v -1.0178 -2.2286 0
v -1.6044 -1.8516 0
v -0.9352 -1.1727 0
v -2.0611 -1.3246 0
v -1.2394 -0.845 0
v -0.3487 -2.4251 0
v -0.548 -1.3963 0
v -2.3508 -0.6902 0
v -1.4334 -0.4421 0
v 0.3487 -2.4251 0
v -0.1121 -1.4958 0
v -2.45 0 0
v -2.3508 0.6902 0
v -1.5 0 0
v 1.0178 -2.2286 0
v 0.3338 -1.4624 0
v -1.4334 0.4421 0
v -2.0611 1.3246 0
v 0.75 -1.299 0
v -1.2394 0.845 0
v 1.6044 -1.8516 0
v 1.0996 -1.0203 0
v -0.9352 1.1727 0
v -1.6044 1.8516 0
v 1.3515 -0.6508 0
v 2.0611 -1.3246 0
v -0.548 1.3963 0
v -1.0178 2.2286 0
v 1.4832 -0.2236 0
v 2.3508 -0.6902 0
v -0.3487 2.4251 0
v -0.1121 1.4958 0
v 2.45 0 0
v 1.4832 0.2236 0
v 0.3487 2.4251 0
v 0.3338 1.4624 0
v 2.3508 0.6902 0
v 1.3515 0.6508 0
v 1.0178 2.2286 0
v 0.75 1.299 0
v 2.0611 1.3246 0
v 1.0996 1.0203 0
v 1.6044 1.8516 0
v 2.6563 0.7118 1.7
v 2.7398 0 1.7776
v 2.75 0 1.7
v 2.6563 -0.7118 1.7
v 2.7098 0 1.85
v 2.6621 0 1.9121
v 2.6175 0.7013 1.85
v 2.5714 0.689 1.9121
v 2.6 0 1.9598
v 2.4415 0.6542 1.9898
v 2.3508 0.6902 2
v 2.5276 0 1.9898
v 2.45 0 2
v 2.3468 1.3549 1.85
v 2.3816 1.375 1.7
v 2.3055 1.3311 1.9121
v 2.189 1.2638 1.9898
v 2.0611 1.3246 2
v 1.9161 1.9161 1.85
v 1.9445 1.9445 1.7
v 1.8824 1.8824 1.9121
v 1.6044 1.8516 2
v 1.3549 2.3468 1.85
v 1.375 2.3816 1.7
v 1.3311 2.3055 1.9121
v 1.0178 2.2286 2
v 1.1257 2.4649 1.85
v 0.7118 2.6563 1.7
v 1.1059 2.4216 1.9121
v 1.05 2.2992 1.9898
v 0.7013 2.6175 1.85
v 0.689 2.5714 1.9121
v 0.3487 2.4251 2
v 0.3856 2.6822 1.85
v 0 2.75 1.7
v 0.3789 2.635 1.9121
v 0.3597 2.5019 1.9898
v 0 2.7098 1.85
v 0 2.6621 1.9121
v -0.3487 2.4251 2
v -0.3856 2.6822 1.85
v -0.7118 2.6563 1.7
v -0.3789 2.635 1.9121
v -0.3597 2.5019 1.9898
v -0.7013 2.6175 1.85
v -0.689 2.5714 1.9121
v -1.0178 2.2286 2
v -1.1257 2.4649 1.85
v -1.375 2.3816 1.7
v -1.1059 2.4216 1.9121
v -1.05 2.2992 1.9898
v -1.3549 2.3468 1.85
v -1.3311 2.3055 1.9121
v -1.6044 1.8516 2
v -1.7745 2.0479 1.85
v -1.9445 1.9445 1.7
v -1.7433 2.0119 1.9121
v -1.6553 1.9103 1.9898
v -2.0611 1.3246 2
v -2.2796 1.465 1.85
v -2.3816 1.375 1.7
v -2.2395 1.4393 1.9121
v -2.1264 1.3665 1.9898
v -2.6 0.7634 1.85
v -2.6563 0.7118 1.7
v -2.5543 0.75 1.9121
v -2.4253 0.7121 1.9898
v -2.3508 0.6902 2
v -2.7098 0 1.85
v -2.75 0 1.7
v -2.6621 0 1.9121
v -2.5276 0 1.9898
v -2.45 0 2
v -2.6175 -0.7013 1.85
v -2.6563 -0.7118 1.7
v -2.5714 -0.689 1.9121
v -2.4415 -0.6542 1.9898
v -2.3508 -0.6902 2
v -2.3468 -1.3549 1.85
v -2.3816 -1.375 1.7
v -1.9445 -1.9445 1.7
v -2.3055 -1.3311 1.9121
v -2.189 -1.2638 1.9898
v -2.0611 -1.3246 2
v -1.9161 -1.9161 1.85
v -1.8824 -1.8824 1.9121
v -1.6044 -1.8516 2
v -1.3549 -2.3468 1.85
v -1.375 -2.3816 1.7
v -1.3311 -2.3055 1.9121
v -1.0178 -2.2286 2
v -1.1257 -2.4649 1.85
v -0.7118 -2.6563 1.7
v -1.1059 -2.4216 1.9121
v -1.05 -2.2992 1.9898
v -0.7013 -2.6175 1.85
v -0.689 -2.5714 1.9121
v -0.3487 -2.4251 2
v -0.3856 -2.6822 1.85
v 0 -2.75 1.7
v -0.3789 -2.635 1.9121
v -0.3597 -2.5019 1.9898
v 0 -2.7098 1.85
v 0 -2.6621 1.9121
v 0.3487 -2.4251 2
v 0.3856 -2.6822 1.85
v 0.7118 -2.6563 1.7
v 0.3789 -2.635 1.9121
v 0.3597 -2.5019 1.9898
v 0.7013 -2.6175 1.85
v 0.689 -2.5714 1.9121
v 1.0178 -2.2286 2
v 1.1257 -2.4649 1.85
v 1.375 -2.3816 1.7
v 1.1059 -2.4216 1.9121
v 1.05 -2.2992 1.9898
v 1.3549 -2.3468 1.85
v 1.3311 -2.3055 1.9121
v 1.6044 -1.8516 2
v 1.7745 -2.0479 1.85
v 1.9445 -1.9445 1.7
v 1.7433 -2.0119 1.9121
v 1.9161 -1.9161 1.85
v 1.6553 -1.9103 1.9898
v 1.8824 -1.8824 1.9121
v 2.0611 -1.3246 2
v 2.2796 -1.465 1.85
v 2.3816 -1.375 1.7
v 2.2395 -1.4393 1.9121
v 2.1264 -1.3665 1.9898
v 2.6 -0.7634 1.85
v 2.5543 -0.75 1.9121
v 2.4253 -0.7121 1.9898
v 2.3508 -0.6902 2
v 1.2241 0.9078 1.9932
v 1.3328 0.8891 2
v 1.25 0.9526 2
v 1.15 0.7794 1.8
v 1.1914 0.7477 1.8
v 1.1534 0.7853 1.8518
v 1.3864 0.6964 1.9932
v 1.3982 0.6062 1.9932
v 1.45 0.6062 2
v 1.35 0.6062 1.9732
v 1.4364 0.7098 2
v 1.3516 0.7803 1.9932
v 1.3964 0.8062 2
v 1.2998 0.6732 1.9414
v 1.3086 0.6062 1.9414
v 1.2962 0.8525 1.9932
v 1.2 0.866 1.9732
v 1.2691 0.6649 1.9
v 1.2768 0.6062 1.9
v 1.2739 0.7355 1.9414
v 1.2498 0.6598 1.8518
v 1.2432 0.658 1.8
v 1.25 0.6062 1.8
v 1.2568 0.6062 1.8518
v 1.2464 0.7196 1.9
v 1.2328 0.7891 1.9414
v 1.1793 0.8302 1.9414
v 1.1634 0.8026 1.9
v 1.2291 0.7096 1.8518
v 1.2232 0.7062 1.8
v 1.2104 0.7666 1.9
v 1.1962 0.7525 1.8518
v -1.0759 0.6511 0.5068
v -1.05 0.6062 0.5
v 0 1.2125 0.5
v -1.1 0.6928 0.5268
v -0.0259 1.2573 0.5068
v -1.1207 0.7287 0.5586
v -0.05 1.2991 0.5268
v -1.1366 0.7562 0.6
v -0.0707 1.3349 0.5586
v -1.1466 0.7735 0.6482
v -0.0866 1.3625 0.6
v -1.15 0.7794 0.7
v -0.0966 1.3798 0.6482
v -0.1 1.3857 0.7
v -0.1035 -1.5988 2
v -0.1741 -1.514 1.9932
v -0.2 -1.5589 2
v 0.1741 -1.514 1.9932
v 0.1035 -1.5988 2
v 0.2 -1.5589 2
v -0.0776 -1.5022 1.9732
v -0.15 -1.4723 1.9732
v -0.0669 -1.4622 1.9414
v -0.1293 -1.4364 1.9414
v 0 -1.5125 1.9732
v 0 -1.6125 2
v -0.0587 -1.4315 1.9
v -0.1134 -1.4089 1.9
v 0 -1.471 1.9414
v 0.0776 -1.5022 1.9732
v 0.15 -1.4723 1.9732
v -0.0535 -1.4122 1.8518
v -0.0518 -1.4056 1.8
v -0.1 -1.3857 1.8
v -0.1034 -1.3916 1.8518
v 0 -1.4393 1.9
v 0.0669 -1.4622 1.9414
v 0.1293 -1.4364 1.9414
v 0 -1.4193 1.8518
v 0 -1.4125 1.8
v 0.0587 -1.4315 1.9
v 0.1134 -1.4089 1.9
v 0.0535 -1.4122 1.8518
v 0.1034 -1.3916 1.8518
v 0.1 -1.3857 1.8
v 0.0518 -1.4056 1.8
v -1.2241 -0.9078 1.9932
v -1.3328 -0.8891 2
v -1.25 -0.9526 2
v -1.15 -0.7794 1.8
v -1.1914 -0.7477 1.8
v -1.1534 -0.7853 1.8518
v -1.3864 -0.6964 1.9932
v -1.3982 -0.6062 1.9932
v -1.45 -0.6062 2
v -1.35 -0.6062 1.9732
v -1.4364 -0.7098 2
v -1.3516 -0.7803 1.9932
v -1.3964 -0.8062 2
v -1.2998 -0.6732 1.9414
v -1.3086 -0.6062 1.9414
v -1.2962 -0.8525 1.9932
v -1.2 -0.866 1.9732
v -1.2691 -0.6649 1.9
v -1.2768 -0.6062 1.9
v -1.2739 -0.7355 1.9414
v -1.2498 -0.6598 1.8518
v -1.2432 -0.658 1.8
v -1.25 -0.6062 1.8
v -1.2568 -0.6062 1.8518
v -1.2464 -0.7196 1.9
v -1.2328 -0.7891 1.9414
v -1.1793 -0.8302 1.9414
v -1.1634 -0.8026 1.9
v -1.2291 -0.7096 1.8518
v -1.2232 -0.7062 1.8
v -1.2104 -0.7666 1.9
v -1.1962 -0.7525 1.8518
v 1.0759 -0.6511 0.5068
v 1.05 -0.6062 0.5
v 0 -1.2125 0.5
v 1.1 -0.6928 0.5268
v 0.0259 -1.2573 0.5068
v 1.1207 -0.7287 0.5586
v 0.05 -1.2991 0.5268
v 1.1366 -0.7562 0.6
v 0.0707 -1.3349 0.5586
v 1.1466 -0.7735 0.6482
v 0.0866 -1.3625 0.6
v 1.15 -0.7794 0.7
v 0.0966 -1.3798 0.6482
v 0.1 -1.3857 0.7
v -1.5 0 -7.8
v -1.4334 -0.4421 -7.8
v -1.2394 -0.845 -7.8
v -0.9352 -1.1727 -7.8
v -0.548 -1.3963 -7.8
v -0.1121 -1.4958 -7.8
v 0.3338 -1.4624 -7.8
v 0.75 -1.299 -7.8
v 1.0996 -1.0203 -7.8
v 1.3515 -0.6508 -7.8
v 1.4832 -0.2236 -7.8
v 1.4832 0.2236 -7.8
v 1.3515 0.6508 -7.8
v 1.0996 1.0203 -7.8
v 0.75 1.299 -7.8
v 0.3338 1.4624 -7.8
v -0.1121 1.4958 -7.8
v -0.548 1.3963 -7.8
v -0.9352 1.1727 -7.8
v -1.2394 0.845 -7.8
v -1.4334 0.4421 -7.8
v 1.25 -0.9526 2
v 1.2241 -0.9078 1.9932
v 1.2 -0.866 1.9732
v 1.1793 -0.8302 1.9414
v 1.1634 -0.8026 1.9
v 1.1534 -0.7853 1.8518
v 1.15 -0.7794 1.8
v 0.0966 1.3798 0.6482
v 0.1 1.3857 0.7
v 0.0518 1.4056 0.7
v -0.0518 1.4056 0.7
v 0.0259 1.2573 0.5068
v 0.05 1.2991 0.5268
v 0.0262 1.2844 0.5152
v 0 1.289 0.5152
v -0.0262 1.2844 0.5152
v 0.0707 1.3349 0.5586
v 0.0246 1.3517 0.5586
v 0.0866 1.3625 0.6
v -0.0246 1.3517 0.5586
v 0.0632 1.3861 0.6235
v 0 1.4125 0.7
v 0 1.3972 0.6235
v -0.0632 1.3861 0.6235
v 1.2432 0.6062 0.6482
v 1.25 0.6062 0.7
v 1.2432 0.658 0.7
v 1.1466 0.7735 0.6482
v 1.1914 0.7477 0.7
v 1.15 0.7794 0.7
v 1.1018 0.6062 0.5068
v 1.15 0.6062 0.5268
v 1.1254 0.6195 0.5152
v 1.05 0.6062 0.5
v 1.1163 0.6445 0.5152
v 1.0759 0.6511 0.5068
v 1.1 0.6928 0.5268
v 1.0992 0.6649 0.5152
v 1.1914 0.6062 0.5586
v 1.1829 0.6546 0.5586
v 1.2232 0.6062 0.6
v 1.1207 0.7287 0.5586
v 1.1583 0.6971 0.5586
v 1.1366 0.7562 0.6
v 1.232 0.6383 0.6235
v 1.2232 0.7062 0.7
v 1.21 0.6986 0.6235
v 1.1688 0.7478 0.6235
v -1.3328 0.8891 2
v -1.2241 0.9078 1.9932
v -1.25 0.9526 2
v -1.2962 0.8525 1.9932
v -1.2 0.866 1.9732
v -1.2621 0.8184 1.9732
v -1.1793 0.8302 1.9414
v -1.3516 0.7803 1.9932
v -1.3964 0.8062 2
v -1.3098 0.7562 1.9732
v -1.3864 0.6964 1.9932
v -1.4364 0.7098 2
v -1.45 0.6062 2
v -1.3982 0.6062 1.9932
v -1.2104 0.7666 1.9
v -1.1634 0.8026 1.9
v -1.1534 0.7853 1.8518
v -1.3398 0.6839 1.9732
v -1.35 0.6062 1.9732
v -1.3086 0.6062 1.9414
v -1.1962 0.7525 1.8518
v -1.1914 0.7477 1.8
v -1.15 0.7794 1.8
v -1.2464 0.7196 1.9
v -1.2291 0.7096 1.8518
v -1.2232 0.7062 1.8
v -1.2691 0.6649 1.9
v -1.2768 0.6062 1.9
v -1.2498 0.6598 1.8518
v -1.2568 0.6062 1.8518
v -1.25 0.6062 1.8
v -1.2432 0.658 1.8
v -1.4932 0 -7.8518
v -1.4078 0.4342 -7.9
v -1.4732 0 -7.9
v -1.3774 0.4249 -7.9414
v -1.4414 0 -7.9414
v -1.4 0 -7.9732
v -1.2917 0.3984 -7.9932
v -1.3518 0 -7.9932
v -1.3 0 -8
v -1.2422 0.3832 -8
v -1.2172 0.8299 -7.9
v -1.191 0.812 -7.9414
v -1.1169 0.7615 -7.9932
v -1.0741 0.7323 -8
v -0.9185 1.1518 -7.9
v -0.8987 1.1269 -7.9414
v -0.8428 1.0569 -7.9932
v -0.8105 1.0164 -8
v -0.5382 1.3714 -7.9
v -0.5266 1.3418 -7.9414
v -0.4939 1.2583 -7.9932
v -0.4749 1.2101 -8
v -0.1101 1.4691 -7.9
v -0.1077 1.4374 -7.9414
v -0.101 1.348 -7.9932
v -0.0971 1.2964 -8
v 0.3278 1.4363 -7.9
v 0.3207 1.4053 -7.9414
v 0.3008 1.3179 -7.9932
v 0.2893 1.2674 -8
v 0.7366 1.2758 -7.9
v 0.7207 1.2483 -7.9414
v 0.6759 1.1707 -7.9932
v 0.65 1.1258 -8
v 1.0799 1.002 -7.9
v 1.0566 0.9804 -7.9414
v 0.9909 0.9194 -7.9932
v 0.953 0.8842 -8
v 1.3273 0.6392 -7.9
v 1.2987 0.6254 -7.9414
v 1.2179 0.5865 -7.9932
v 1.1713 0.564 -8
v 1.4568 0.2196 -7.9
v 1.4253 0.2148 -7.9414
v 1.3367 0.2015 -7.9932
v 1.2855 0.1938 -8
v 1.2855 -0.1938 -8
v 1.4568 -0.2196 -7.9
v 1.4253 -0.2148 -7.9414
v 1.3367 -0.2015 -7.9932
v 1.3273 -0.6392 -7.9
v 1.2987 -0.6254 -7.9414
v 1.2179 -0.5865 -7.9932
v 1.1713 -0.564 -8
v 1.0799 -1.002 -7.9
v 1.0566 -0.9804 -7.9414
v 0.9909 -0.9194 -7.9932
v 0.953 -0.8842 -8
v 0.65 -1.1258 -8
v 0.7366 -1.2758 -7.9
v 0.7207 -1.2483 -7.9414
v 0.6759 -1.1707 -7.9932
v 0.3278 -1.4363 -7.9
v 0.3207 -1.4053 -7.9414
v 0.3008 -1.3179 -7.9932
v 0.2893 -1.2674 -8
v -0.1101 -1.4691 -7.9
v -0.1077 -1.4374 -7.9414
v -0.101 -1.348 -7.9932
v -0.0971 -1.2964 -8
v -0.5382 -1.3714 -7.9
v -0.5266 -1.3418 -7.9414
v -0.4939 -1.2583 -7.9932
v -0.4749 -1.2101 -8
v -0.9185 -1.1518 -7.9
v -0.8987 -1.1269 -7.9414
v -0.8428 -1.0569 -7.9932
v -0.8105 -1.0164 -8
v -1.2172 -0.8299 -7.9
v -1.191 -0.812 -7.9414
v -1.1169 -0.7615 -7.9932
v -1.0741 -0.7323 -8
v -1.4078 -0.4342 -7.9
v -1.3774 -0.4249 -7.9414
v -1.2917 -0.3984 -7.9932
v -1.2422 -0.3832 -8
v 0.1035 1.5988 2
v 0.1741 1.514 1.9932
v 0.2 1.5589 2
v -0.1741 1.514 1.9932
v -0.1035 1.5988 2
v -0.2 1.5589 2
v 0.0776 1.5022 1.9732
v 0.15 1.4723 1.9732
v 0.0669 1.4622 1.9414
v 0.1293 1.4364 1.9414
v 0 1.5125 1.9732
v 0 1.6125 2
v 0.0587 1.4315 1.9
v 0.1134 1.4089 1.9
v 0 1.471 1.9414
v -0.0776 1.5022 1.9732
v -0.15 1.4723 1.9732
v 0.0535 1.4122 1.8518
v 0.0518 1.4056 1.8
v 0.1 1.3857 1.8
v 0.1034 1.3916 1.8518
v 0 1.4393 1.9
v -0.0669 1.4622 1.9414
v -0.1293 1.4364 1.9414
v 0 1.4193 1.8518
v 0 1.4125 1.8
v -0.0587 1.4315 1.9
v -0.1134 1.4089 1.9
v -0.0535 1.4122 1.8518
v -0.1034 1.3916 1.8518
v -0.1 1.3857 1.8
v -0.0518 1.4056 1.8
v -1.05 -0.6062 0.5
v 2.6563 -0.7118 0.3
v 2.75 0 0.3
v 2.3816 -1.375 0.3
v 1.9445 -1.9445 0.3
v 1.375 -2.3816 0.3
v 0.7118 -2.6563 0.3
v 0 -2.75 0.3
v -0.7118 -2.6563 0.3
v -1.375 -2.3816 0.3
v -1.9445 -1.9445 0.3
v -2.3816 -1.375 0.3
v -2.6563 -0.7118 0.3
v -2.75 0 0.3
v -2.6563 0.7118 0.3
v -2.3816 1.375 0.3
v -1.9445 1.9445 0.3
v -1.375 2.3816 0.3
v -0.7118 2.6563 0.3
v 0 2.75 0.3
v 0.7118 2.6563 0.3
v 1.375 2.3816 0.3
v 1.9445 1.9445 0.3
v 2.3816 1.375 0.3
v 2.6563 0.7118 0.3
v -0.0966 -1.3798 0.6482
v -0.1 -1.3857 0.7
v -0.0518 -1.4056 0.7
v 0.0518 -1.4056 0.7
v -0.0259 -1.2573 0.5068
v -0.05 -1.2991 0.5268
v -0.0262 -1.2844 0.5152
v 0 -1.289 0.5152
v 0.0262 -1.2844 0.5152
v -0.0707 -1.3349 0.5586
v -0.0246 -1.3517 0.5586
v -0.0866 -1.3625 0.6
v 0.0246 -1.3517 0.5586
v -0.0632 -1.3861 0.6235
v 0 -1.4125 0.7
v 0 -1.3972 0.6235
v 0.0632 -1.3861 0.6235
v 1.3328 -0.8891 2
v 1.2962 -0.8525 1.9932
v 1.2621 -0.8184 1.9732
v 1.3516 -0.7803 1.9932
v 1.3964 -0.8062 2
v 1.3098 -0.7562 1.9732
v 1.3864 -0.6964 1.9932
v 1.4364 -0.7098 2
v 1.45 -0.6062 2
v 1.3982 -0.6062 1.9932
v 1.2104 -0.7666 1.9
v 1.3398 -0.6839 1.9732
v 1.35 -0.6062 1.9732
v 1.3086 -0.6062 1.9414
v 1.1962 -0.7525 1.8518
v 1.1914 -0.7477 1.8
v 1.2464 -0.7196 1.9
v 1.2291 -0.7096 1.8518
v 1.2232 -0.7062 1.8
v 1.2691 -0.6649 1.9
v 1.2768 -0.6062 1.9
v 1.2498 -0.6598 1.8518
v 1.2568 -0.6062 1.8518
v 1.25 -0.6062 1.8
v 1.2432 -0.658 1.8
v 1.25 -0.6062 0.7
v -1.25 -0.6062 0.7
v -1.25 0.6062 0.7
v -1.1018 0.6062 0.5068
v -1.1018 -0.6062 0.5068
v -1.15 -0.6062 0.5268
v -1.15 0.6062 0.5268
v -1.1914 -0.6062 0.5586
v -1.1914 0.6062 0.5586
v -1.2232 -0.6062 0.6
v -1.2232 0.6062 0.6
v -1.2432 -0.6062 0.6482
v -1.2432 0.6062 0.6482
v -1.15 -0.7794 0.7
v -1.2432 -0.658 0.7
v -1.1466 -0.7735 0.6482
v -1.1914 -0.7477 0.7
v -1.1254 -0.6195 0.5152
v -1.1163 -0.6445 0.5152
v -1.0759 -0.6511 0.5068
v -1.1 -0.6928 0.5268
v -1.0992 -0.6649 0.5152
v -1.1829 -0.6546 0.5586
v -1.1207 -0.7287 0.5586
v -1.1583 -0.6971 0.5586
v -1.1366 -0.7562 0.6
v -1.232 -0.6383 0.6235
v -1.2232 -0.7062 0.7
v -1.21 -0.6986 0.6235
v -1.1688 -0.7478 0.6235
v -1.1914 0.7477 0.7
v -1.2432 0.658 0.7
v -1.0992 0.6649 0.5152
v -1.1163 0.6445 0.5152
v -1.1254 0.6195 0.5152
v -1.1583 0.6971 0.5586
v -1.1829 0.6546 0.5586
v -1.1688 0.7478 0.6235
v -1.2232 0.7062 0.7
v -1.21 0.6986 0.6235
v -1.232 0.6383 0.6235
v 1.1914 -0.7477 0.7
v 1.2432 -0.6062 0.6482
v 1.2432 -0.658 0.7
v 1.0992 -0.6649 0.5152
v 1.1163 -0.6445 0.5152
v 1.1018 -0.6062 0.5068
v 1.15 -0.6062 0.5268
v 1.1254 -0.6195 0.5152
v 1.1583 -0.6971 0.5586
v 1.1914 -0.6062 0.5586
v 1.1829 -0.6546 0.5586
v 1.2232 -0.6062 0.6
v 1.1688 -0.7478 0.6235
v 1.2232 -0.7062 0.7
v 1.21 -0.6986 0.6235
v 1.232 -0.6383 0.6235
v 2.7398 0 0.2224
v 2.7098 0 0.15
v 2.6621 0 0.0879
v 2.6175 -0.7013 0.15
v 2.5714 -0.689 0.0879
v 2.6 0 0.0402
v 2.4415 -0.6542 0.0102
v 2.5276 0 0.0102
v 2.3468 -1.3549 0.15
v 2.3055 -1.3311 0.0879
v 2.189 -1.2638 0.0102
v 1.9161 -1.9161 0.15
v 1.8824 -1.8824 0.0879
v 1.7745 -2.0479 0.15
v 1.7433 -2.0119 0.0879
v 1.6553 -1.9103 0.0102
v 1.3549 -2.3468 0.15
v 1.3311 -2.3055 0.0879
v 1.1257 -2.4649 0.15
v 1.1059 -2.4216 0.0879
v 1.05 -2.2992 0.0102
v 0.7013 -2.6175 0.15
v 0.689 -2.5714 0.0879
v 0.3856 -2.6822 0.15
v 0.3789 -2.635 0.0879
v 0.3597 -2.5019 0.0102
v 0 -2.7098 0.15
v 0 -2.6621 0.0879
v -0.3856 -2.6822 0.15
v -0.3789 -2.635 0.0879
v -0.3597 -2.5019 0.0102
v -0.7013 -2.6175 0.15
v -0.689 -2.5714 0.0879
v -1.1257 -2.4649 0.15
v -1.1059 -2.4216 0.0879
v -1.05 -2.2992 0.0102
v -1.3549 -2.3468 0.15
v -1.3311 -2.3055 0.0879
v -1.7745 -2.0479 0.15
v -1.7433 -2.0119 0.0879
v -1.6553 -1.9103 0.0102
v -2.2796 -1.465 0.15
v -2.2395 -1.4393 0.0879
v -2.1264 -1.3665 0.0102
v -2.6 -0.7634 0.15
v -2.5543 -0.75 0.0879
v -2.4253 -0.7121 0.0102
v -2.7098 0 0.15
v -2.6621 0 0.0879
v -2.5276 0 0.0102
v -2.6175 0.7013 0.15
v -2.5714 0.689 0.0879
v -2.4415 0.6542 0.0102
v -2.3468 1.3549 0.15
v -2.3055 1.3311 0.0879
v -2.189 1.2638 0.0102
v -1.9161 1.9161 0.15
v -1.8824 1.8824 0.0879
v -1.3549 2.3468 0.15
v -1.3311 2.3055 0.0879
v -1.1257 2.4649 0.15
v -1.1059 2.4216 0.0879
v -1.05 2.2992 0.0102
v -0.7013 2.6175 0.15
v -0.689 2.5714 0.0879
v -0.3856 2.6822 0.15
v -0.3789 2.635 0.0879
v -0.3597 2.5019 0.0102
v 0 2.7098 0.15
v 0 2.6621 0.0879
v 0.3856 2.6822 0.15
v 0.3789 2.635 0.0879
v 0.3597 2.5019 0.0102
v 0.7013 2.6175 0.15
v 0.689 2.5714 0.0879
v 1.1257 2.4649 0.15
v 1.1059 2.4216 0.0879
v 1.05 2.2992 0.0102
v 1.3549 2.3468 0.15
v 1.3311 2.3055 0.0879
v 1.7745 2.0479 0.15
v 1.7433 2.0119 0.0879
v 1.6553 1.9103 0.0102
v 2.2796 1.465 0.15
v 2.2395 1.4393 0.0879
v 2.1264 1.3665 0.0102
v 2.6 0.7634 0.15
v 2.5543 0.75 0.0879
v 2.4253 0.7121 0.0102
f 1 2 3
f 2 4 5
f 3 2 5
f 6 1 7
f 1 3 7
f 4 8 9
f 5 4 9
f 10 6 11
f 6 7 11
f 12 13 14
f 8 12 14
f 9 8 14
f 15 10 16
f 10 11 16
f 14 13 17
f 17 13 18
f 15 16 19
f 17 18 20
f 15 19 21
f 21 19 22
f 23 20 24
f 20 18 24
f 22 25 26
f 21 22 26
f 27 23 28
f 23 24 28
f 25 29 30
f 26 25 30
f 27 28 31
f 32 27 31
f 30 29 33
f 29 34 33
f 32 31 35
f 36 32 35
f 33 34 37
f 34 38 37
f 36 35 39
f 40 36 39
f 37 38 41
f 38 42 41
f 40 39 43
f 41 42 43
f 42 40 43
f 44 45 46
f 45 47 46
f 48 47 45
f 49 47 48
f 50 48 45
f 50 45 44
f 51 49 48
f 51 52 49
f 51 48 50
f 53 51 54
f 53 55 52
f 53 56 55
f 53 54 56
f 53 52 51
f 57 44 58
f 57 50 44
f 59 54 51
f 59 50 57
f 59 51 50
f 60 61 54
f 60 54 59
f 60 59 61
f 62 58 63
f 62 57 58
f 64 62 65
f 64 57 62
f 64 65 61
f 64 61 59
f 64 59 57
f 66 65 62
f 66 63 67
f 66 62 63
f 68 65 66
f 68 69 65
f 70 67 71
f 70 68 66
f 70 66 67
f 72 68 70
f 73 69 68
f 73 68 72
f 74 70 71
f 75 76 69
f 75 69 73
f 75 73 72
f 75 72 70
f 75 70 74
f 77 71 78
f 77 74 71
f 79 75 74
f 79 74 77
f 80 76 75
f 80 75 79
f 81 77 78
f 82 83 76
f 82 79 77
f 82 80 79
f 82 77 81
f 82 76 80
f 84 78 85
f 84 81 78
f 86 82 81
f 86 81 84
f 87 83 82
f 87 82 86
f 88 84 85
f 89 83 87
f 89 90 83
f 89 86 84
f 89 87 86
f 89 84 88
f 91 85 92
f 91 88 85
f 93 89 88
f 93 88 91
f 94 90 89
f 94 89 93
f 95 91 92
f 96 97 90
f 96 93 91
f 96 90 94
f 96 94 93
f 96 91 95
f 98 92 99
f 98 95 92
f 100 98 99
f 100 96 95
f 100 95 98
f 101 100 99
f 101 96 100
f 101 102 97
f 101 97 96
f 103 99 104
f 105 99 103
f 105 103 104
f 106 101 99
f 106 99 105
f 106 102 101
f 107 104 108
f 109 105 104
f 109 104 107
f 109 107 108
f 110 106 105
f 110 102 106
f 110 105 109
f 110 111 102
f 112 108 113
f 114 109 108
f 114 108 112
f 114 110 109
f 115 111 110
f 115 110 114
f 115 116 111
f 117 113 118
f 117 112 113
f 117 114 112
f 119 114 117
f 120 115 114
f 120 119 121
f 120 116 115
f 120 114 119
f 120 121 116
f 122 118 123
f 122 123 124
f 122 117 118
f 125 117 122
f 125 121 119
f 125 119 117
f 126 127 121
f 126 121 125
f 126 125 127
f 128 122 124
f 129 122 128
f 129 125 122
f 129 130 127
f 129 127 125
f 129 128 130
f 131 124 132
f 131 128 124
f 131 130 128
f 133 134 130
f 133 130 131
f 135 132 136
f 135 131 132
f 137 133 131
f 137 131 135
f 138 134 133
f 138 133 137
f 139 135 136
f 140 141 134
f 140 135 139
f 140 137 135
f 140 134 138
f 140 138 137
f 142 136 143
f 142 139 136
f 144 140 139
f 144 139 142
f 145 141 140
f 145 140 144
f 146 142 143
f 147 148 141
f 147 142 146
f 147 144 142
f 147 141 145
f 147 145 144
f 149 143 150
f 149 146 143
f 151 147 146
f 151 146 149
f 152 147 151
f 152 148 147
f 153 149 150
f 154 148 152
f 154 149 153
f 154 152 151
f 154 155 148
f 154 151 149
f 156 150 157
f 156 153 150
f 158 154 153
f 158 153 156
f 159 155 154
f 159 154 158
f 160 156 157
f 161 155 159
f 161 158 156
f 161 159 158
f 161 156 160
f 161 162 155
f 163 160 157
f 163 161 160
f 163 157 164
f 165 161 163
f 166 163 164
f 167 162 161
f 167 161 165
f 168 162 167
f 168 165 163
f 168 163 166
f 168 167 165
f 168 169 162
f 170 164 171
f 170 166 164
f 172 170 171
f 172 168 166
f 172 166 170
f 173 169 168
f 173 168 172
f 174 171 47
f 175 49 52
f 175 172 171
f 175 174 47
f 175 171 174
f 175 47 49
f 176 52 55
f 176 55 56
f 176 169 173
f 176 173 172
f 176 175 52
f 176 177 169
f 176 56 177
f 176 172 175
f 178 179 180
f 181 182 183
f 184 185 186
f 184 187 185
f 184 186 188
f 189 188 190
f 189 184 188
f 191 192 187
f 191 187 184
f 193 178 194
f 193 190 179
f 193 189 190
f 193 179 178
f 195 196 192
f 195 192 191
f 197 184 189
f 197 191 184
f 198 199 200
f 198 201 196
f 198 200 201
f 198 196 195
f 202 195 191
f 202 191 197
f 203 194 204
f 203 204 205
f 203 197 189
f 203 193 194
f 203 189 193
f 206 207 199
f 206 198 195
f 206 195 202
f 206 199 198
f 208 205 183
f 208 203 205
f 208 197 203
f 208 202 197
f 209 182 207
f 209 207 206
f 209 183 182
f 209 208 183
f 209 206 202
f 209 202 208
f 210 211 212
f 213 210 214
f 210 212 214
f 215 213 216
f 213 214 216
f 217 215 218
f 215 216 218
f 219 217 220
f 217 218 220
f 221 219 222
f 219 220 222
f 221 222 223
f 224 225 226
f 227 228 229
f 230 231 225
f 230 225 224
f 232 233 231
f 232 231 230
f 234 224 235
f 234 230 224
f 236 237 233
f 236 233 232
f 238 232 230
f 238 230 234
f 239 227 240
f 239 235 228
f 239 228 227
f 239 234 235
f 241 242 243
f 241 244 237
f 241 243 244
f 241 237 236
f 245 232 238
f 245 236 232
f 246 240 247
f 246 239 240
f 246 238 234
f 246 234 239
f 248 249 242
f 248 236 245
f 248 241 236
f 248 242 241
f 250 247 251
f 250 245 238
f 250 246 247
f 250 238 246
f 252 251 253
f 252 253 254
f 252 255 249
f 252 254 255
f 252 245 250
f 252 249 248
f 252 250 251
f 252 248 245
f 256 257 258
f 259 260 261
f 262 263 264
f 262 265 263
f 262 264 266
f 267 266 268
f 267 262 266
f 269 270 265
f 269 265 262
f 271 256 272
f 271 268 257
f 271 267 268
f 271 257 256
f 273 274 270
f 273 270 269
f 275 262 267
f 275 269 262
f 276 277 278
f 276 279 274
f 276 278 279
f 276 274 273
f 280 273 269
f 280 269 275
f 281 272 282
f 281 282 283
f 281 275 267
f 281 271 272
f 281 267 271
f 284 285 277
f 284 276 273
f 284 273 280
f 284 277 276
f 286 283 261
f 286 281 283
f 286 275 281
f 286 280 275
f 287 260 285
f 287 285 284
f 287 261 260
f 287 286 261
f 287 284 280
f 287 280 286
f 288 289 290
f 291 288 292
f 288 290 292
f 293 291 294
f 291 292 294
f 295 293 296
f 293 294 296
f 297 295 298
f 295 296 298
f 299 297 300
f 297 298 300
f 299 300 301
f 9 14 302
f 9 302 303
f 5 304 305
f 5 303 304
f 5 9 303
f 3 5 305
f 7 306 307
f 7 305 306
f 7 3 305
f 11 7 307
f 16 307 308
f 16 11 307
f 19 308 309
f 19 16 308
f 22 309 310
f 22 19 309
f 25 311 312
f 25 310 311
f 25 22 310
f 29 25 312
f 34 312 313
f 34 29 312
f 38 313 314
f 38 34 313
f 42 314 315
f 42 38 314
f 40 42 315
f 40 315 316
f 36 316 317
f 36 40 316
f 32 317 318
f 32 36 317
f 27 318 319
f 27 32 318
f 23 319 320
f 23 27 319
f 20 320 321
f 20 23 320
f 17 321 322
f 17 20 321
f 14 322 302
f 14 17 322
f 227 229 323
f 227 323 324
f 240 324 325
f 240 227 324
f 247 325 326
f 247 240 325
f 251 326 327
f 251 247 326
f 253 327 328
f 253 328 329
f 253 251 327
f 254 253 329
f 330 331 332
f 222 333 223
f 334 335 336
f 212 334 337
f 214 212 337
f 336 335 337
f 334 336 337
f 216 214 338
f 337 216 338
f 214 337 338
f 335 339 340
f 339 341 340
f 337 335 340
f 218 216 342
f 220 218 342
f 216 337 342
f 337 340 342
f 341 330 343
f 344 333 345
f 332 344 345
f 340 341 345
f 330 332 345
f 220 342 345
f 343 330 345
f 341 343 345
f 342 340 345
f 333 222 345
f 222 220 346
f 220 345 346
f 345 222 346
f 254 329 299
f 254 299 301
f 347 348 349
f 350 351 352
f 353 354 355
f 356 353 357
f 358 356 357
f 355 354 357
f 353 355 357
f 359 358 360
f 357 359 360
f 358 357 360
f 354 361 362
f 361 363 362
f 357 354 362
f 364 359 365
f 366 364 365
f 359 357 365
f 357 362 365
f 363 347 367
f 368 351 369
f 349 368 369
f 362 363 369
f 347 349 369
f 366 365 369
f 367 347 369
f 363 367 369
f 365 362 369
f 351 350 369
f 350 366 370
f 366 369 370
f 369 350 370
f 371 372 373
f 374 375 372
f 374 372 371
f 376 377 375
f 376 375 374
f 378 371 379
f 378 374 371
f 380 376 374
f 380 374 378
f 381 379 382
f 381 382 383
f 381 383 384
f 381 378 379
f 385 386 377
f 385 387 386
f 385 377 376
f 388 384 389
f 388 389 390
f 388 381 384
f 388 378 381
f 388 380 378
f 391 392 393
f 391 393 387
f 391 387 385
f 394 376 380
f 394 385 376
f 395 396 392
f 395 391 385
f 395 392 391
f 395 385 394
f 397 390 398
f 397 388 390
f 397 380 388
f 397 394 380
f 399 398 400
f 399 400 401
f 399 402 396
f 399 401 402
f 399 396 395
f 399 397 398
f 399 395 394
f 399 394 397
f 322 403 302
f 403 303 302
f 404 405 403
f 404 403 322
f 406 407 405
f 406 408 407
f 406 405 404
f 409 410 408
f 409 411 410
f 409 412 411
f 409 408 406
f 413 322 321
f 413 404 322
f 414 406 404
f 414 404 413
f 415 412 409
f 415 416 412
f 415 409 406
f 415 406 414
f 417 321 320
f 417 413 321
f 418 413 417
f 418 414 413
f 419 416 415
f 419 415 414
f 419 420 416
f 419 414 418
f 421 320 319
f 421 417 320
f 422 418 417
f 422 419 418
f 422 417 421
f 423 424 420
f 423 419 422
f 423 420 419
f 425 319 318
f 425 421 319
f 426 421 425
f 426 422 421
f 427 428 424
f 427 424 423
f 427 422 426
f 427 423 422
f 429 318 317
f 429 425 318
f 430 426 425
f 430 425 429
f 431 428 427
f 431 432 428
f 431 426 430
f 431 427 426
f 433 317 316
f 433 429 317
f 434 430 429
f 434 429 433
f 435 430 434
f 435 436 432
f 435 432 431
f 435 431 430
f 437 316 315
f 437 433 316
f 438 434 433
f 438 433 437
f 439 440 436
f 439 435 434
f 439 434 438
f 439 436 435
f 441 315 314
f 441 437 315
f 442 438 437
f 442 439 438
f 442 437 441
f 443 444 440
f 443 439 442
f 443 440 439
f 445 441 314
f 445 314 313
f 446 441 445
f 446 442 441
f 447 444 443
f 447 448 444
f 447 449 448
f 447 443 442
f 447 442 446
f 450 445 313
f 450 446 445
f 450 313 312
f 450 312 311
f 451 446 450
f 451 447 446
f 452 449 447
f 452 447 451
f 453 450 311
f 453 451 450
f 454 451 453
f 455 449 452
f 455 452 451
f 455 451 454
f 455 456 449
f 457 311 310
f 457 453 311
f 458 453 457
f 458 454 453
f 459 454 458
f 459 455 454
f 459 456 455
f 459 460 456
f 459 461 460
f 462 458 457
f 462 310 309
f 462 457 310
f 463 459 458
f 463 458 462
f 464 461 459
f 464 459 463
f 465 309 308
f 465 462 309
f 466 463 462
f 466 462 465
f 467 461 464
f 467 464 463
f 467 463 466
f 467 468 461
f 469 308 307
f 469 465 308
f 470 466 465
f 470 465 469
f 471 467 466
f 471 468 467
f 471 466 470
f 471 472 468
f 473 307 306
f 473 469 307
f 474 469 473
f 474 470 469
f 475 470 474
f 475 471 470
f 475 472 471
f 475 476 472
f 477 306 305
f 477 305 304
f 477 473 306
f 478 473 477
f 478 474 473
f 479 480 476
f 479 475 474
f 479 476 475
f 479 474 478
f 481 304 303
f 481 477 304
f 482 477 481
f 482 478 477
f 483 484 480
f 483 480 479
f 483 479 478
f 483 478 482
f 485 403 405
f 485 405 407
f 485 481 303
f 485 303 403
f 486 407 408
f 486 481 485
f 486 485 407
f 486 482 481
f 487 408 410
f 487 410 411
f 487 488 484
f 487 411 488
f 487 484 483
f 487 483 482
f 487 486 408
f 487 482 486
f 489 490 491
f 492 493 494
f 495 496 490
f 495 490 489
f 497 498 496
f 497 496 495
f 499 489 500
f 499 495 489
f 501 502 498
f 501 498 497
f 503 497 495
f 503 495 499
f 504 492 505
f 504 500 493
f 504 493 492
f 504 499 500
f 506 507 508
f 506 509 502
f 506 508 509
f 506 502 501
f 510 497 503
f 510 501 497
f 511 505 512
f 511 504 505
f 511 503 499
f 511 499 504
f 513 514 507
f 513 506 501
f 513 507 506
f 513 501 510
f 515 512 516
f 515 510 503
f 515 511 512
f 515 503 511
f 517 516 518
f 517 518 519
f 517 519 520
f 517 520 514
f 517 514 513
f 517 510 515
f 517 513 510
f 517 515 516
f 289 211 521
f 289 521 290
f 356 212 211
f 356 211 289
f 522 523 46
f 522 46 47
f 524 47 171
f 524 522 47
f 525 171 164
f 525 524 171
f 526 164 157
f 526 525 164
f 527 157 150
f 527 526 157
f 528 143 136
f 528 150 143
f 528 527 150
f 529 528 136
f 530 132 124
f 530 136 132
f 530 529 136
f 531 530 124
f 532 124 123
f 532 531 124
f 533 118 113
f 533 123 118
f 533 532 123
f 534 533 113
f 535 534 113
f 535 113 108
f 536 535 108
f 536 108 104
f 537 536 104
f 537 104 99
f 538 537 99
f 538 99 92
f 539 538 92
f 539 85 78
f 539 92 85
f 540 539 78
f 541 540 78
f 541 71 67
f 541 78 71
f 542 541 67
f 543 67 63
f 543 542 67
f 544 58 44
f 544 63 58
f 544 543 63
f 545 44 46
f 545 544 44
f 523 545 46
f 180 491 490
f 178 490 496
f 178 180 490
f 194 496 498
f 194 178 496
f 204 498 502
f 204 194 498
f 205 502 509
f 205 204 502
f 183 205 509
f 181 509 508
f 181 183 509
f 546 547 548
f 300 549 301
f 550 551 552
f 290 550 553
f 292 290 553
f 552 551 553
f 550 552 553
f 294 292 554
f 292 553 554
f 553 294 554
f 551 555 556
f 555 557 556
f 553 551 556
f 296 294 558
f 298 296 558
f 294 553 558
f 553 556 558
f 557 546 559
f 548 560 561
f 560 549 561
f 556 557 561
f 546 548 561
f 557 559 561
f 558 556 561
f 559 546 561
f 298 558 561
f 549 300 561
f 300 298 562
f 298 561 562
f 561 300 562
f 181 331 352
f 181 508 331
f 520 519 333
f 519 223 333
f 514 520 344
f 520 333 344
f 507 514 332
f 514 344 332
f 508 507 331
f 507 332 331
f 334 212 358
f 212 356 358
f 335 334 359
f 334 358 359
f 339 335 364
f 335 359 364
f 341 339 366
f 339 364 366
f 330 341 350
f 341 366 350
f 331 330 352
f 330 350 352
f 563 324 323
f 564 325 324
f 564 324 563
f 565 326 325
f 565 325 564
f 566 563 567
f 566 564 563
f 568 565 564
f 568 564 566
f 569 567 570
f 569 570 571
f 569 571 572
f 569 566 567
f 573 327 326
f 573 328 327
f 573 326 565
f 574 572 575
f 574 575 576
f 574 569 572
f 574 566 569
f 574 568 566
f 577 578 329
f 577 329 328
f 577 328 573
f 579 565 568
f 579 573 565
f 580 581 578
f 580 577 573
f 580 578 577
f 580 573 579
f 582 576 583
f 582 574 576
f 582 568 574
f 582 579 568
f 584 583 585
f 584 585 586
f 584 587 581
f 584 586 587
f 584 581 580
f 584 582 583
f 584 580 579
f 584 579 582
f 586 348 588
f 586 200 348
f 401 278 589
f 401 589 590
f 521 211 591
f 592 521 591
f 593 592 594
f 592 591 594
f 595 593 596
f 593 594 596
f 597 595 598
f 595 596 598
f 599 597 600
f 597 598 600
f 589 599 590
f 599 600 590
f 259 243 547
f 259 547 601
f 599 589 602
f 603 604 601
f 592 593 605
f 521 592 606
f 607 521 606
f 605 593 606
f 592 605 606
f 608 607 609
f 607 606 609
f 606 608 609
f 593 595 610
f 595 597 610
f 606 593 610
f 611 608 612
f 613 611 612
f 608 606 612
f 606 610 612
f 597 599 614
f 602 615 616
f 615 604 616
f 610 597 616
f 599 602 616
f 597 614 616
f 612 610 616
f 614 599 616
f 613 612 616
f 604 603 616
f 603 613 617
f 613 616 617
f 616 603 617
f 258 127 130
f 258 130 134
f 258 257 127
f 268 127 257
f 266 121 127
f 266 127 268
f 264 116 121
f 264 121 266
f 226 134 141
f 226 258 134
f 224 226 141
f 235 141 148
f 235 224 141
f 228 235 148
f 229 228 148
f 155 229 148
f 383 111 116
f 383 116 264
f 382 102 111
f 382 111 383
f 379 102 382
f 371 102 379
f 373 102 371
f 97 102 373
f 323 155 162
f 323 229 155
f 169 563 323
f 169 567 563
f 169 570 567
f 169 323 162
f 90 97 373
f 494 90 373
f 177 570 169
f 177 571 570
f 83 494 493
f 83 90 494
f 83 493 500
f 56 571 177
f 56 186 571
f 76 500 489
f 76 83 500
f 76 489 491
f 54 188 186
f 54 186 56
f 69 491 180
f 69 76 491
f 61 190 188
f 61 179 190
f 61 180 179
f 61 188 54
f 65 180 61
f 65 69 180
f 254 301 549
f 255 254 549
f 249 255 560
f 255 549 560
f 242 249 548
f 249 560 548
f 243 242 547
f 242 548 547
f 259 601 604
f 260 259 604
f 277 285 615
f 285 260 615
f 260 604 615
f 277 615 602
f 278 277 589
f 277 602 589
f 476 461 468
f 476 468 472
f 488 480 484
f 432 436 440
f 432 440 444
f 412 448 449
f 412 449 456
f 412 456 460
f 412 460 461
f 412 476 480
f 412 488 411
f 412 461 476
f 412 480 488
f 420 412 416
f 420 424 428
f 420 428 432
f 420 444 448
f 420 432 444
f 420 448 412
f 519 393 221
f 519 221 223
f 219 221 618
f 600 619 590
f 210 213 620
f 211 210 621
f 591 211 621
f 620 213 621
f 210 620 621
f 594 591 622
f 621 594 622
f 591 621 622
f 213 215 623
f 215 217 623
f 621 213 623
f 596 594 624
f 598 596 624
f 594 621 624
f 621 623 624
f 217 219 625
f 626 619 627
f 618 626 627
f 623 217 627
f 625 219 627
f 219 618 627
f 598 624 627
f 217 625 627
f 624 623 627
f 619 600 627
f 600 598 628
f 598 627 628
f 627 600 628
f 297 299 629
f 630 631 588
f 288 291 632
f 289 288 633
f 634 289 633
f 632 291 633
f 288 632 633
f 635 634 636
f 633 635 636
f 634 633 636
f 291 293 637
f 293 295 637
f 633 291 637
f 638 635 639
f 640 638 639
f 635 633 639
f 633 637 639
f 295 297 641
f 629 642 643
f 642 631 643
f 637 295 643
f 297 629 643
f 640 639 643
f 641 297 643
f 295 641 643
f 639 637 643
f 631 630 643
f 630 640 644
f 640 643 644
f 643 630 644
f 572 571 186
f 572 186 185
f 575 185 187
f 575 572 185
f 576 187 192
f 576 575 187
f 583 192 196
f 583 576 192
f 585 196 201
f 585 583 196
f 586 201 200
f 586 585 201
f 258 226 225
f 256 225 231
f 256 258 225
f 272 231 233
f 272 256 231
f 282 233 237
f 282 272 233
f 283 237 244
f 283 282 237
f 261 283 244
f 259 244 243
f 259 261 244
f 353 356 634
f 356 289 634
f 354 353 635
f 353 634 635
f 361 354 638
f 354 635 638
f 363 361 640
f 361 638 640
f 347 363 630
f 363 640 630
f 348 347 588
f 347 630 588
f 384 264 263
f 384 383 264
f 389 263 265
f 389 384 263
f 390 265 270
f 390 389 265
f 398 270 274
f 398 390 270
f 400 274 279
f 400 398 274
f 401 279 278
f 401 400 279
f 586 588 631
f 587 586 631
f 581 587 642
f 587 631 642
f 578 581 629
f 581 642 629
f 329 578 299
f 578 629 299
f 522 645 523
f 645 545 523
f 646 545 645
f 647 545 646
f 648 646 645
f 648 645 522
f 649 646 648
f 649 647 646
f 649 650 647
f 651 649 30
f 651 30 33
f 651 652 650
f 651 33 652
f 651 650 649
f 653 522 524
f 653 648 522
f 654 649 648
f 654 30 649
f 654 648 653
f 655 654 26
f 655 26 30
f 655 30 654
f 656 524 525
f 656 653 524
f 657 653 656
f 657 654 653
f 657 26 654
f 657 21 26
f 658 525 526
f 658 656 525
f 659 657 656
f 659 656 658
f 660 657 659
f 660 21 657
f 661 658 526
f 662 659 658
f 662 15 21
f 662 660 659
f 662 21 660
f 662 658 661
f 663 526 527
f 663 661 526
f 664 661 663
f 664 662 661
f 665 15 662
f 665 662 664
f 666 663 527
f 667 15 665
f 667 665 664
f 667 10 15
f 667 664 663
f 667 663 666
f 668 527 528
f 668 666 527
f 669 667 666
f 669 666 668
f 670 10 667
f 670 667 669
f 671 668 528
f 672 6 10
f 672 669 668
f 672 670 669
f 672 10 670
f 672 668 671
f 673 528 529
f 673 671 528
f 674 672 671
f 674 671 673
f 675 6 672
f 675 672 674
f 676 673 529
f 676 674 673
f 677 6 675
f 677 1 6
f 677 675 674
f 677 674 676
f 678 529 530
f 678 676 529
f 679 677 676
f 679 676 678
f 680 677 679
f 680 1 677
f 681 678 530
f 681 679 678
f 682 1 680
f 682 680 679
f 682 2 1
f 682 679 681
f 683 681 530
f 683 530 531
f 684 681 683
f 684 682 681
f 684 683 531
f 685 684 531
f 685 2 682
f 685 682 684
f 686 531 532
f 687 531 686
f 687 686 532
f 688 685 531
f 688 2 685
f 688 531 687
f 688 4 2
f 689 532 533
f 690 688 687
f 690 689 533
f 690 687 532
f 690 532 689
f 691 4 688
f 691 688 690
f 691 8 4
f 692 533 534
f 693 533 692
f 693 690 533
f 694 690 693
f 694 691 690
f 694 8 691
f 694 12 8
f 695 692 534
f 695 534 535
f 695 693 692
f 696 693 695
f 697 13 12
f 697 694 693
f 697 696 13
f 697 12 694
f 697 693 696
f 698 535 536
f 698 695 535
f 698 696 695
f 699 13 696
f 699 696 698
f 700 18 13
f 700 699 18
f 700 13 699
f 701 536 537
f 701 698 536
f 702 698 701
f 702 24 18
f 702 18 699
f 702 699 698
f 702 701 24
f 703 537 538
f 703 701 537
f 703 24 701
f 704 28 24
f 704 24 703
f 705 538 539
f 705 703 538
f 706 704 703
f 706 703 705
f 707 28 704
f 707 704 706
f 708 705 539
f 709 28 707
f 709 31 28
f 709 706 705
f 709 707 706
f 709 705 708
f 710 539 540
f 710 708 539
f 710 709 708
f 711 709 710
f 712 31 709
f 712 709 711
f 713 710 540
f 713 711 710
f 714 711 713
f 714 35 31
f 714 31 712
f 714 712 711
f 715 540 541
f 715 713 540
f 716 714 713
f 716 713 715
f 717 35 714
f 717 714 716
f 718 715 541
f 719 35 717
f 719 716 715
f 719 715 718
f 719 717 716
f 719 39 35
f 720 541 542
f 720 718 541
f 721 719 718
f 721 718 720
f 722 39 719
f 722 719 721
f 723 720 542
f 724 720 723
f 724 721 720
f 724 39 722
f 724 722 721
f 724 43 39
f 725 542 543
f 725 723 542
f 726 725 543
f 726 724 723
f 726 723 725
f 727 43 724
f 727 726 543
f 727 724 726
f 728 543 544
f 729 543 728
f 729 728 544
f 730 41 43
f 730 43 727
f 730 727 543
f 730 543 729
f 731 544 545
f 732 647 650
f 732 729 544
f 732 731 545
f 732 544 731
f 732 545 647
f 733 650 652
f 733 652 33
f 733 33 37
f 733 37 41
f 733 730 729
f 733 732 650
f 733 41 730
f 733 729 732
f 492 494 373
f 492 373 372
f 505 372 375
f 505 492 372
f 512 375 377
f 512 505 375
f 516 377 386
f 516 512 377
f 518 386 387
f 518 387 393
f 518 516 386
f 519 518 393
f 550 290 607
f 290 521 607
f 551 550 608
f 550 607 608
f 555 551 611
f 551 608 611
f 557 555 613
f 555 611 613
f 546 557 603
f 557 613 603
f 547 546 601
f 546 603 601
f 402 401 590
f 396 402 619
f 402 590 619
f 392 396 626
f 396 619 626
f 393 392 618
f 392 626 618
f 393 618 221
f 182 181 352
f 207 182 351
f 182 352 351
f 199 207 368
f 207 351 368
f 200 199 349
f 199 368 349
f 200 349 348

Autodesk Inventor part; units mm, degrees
ref_plane "YZ Plane" through (0, 0, 0) normal (1, 0, 0) x (0, 1, 0)
ref_plane "XZ Plane" through (0, 0, 0) normal (0, 1, 0) x (-1, 0, 0)
ref_plane "XY Plane" through (0, 0, 0) normal (0, 0, 1) x (1, 0, 0)
sketch "スケッチ1" plane through (0, 0, 0) normal (0, 0, 1) x (1, 0, 0)
  circle A0 centre (0, 0) radius 2.75
  dimension "d0" = 5.5
extrude "押し出し1" add sketch "スケッチ1" along normal blind 2
sketch "スケッチ2" plane through (0, 0, 0) normal (0, 0, -1) x (-1, 0, 0)
  circle A0 centre (0, 0) radius 2.75 projected
  circle A1 centre (0, 0) radius 1.5
  dimension "d3" = 3
extrude "押し出し2" add sketch "スケッチ2" along normal blind 8 contours A1
sketch "スケッチ3" plane through (0, 0, 2) normal (0, 0, 1) x (1, 0, 0)
  circle A0 centre (0, 0) radius 2.75 projected
  line L0 (0, 1.4434) -> (1.25, 0.7217)
  line L1 (1.25, 0.7217) -> (1.25, -0.7217)
  line L2 (1.25, -0.7217) -> (0, -1.4434)
  line L3 (0, -1.4434) -> (-1.25, -0.7217)
  line L4 (-1.25, -0.7217) -> (-1.25, 0.7217)
  line L5 (-1.25, 0.7217) -> (0, 1.4434)
  dimension "d6" = 1.25
extrude "押し出し3" cut sketch "スケッチ3" against normal blind 1.5 contours L0 L1 L2 L3 L4 L5
fillet "フィレット1" radius 0.3 2 edges at (-2.75, 0, 2) (-2.75, 0, 0)
fillet "フィレット2" radius 0.2 19 edges at (-0.625, 1.0825, 2) (-1.25, 0, 2) (-0.625, -1.0825, 2) (0.625, -1.0825, 2) (1.25, 0, 2) (0.625, 1.0825, 2) (-0.625, 1.0825, 0.5) (0.625, 1.0825, 0.5) (0, 1.4434, 1.25) (-1.25, 0.7217, 1.25) (-0.625, -1.0825, 0.5) (-1.25, -0.7217, 1.25) (-1.25, 0, 0.5) (1.25, 0, 0.5) (1.25, 0.7217, 1.25) (1.25, -0.7217, 1.25) (0.625, -1.0825, 0.5) (0, -1.4434, 1.25) (1.5, 0, -8)
thread "ねじ2" size "M3x0.5" class "6g" standard "ANSI Metric M Profile" full length
